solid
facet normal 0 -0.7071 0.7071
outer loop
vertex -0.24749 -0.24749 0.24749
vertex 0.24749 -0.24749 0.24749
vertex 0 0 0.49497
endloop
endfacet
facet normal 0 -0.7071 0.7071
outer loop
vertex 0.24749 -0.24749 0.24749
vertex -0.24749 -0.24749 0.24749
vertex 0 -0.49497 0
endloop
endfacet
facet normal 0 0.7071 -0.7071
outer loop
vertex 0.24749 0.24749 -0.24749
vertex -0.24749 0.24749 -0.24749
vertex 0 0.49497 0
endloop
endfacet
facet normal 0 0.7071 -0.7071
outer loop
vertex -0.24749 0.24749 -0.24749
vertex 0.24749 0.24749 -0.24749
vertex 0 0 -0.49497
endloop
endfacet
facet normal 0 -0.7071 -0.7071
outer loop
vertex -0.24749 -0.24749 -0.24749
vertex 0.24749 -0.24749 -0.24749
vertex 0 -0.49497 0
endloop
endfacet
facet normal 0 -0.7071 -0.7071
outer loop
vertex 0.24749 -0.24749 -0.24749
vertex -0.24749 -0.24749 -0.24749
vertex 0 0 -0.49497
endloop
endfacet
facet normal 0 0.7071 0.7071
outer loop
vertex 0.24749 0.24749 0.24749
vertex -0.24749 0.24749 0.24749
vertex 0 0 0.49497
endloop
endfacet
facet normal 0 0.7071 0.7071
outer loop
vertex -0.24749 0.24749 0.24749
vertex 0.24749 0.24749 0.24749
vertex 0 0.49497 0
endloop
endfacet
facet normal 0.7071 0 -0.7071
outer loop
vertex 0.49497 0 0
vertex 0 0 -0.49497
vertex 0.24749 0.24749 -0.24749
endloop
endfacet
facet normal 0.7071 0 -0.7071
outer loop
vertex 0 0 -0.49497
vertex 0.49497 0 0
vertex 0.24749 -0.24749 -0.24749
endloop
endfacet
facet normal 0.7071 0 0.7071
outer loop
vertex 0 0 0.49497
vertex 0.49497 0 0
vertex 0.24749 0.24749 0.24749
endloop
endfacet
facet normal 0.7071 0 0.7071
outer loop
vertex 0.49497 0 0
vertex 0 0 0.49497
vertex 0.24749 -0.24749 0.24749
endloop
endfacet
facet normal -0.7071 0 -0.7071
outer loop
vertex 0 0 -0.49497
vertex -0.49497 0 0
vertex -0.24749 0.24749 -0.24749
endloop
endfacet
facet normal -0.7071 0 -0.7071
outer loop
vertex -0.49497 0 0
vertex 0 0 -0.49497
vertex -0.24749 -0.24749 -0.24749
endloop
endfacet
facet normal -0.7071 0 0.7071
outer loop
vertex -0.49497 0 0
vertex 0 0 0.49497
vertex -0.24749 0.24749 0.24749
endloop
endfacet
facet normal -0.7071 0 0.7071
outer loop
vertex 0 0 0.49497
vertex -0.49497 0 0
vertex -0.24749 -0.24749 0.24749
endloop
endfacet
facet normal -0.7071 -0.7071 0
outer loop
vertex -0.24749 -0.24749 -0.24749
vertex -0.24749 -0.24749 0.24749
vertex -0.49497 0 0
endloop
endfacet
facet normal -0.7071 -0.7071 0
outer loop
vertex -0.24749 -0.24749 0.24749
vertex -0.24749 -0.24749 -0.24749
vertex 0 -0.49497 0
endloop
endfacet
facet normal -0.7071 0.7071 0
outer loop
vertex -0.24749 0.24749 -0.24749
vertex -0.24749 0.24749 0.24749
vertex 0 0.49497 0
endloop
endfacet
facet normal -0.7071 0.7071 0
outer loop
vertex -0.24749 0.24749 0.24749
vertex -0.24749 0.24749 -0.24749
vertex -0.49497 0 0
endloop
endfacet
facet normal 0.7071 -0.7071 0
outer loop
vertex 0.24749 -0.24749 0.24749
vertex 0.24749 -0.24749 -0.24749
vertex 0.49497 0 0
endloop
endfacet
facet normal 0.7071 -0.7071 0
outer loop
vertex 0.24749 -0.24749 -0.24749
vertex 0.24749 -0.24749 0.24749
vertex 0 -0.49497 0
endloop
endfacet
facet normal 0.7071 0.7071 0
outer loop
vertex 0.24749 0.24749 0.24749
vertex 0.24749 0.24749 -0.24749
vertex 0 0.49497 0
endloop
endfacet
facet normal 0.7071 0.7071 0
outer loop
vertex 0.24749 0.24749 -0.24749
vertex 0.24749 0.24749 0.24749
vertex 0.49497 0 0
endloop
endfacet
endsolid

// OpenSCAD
size = 1;
intersection() {
    cube([size,size,size], center=true);
    b = size*3;
    s = size*0.7;
    rotate([45,0,0])
    cube([b,s,s], center=true);
    rotate([0,45,0])
    cube([s,b,s], center=true);
    rotate([0,0,45])
    cube([s,s,b], center=true);
}
